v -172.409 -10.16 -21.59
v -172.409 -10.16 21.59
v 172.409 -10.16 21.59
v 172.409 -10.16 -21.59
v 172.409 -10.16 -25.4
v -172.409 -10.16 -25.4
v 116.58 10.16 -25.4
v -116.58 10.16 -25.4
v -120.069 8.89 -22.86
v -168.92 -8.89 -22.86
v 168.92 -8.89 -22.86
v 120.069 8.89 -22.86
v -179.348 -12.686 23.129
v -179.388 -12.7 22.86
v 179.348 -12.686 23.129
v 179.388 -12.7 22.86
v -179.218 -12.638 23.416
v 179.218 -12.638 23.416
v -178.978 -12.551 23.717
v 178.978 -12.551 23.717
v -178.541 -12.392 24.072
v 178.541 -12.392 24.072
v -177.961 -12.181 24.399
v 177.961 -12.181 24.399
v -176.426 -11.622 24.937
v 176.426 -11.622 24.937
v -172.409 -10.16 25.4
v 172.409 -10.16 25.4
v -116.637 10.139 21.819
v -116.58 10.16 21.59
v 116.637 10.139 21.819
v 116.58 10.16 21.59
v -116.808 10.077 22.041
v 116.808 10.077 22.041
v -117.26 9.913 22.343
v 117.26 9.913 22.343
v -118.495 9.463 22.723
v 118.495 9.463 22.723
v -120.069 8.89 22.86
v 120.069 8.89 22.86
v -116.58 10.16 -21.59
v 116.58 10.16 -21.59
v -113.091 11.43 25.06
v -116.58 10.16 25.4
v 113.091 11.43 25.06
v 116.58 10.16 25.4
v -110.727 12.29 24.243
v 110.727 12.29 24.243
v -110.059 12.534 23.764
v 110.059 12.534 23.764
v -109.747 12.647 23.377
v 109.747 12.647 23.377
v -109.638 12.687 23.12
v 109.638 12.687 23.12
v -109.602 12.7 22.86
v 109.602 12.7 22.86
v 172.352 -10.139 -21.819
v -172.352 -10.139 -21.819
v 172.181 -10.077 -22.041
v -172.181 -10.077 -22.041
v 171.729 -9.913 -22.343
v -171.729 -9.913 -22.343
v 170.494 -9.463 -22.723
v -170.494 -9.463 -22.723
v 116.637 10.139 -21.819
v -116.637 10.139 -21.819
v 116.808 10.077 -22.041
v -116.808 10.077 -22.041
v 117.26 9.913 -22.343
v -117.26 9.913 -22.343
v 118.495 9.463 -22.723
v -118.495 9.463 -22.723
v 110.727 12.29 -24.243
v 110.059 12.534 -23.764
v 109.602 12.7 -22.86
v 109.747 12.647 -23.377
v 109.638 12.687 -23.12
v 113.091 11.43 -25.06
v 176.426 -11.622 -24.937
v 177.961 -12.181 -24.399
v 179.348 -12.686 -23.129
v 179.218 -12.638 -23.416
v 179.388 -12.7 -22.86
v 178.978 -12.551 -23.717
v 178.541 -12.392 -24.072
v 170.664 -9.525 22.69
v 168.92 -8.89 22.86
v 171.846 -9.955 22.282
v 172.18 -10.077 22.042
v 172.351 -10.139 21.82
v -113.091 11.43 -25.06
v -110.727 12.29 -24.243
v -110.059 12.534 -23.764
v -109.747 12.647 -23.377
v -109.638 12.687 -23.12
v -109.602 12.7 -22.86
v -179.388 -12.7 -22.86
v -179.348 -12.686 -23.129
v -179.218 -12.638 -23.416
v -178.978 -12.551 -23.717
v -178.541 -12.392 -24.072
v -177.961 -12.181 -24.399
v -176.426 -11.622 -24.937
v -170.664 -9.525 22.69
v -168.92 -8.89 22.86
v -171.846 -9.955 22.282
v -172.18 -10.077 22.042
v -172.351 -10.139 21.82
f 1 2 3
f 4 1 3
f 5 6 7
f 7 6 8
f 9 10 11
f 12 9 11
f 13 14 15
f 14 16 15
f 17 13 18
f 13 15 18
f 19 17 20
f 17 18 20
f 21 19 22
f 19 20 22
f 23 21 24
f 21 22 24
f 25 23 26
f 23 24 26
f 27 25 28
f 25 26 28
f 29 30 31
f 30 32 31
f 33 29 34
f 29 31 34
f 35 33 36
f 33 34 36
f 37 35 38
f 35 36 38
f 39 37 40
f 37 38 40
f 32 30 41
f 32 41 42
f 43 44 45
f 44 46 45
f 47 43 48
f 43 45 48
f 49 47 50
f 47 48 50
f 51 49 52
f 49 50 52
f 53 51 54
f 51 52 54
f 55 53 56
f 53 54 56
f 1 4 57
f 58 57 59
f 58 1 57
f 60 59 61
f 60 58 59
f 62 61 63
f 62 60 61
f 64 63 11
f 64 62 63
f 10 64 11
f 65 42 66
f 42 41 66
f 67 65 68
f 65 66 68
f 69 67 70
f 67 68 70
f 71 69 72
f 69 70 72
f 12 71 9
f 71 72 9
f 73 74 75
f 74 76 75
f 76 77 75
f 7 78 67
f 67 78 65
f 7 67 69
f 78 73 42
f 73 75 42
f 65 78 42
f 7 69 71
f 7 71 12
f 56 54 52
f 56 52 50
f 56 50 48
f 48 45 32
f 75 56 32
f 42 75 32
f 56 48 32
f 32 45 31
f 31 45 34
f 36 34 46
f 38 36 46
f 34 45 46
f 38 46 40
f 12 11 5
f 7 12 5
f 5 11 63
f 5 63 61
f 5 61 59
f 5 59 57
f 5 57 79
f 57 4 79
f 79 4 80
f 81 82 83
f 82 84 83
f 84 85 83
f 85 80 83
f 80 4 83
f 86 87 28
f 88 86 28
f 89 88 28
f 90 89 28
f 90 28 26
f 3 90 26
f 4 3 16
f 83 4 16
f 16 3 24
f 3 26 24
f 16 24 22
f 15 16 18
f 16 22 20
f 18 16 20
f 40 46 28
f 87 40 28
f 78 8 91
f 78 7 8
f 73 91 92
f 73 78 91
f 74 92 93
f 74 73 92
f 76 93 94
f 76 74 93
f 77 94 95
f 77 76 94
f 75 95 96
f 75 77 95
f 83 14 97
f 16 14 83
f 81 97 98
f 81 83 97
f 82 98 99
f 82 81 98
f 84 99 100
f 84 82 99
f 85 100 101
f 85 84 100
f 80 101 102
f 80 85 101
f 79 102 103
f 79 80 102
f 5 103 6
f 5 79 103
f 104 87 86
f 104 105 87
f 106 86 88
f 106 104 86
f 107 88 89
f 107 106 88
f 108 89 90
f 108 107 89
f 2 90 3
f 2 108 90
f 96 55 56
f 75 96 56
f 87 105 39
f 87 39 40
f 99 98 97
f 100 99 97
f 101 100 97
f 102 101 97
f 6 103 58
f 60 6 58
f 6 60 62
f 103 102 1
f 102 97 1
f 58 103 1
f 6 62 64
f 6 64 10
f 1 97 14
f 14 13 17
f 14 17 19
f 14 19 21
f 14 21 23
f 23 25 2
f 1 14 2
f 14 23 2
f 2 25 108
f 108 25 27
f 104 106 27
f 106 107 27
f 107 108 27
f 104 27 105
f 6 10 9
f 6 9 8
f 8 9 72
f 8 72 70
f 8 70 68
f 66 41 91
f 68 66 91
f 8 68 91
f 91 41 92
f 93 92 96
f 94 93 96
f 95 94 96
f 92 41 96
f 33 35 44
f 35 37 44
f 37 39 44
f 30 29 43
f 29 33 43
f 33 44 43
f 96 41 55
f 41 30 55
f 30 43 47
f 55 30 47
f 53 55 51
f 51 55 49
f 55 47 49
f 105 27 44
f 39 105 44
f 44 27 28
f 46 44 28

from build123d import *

# Parameters (mm, degrees)
F0_W     = 358.775
F0_H     = 50.8
F1_DEPTH = 12.7
F2_T     = -2.54
F4_DEPTH = 50.801
F5_R     = 2.54
F6_R     = 1.27


with BuildPart() as f1:
    # F0 (on Front) → F1 (new body, symmetric)
    with BuildSketch(Plane.XZ):
        Rectangle(F0_W, F0_H)
    extrude(amount=F1_DEPTH, both=True)

    # F2
    f2_openings = [f1.faces().sort_by_distance(p)[0] for p in [
        (-179.3875, 0, 0),
        (179.3875, 0, 0),
    ]]
    offset(amount=F2_T, openings=f2_openings)

    # F3 (on face) → F4 (cut, through all)
    with BuildSketch(Plane.XY.offset(25.4)):
        Polygon((-179.3875, 12.7), (-179.3875, -12.7), (-109.6015735459, 12.7), align=None)
        Polygon((109.6015735459, 12.7), (179.3875, -12.7), (179.3875, 12.7), align=None)
    extrude(amount=-F4_DEPTH, mode=Mode.SUBTRACT)

    # F5
    f5_edges = [f1.edges().sort_by_distance(p)[0] for p in [
        (0, -12.7, 25.4),
        (0, 12.7, 25.4),
        (0, 12.7, -25.4),
        (0, -12.7, -25.4),
    ]]
    fillet(f5_edges, radius=F5_R)

    # F6
    f6_edges = [f1.edges().sort_by_distance(p)[0] for p in [
        (0, -10.16, -22.86),
        (0, -10.16, 22.86),
        (0, 10.16, 22.86),
        (0, 10.16, -22.86),
    ]]
    fillet(f6_edges, radius=F6_R)


solid = f1.part
